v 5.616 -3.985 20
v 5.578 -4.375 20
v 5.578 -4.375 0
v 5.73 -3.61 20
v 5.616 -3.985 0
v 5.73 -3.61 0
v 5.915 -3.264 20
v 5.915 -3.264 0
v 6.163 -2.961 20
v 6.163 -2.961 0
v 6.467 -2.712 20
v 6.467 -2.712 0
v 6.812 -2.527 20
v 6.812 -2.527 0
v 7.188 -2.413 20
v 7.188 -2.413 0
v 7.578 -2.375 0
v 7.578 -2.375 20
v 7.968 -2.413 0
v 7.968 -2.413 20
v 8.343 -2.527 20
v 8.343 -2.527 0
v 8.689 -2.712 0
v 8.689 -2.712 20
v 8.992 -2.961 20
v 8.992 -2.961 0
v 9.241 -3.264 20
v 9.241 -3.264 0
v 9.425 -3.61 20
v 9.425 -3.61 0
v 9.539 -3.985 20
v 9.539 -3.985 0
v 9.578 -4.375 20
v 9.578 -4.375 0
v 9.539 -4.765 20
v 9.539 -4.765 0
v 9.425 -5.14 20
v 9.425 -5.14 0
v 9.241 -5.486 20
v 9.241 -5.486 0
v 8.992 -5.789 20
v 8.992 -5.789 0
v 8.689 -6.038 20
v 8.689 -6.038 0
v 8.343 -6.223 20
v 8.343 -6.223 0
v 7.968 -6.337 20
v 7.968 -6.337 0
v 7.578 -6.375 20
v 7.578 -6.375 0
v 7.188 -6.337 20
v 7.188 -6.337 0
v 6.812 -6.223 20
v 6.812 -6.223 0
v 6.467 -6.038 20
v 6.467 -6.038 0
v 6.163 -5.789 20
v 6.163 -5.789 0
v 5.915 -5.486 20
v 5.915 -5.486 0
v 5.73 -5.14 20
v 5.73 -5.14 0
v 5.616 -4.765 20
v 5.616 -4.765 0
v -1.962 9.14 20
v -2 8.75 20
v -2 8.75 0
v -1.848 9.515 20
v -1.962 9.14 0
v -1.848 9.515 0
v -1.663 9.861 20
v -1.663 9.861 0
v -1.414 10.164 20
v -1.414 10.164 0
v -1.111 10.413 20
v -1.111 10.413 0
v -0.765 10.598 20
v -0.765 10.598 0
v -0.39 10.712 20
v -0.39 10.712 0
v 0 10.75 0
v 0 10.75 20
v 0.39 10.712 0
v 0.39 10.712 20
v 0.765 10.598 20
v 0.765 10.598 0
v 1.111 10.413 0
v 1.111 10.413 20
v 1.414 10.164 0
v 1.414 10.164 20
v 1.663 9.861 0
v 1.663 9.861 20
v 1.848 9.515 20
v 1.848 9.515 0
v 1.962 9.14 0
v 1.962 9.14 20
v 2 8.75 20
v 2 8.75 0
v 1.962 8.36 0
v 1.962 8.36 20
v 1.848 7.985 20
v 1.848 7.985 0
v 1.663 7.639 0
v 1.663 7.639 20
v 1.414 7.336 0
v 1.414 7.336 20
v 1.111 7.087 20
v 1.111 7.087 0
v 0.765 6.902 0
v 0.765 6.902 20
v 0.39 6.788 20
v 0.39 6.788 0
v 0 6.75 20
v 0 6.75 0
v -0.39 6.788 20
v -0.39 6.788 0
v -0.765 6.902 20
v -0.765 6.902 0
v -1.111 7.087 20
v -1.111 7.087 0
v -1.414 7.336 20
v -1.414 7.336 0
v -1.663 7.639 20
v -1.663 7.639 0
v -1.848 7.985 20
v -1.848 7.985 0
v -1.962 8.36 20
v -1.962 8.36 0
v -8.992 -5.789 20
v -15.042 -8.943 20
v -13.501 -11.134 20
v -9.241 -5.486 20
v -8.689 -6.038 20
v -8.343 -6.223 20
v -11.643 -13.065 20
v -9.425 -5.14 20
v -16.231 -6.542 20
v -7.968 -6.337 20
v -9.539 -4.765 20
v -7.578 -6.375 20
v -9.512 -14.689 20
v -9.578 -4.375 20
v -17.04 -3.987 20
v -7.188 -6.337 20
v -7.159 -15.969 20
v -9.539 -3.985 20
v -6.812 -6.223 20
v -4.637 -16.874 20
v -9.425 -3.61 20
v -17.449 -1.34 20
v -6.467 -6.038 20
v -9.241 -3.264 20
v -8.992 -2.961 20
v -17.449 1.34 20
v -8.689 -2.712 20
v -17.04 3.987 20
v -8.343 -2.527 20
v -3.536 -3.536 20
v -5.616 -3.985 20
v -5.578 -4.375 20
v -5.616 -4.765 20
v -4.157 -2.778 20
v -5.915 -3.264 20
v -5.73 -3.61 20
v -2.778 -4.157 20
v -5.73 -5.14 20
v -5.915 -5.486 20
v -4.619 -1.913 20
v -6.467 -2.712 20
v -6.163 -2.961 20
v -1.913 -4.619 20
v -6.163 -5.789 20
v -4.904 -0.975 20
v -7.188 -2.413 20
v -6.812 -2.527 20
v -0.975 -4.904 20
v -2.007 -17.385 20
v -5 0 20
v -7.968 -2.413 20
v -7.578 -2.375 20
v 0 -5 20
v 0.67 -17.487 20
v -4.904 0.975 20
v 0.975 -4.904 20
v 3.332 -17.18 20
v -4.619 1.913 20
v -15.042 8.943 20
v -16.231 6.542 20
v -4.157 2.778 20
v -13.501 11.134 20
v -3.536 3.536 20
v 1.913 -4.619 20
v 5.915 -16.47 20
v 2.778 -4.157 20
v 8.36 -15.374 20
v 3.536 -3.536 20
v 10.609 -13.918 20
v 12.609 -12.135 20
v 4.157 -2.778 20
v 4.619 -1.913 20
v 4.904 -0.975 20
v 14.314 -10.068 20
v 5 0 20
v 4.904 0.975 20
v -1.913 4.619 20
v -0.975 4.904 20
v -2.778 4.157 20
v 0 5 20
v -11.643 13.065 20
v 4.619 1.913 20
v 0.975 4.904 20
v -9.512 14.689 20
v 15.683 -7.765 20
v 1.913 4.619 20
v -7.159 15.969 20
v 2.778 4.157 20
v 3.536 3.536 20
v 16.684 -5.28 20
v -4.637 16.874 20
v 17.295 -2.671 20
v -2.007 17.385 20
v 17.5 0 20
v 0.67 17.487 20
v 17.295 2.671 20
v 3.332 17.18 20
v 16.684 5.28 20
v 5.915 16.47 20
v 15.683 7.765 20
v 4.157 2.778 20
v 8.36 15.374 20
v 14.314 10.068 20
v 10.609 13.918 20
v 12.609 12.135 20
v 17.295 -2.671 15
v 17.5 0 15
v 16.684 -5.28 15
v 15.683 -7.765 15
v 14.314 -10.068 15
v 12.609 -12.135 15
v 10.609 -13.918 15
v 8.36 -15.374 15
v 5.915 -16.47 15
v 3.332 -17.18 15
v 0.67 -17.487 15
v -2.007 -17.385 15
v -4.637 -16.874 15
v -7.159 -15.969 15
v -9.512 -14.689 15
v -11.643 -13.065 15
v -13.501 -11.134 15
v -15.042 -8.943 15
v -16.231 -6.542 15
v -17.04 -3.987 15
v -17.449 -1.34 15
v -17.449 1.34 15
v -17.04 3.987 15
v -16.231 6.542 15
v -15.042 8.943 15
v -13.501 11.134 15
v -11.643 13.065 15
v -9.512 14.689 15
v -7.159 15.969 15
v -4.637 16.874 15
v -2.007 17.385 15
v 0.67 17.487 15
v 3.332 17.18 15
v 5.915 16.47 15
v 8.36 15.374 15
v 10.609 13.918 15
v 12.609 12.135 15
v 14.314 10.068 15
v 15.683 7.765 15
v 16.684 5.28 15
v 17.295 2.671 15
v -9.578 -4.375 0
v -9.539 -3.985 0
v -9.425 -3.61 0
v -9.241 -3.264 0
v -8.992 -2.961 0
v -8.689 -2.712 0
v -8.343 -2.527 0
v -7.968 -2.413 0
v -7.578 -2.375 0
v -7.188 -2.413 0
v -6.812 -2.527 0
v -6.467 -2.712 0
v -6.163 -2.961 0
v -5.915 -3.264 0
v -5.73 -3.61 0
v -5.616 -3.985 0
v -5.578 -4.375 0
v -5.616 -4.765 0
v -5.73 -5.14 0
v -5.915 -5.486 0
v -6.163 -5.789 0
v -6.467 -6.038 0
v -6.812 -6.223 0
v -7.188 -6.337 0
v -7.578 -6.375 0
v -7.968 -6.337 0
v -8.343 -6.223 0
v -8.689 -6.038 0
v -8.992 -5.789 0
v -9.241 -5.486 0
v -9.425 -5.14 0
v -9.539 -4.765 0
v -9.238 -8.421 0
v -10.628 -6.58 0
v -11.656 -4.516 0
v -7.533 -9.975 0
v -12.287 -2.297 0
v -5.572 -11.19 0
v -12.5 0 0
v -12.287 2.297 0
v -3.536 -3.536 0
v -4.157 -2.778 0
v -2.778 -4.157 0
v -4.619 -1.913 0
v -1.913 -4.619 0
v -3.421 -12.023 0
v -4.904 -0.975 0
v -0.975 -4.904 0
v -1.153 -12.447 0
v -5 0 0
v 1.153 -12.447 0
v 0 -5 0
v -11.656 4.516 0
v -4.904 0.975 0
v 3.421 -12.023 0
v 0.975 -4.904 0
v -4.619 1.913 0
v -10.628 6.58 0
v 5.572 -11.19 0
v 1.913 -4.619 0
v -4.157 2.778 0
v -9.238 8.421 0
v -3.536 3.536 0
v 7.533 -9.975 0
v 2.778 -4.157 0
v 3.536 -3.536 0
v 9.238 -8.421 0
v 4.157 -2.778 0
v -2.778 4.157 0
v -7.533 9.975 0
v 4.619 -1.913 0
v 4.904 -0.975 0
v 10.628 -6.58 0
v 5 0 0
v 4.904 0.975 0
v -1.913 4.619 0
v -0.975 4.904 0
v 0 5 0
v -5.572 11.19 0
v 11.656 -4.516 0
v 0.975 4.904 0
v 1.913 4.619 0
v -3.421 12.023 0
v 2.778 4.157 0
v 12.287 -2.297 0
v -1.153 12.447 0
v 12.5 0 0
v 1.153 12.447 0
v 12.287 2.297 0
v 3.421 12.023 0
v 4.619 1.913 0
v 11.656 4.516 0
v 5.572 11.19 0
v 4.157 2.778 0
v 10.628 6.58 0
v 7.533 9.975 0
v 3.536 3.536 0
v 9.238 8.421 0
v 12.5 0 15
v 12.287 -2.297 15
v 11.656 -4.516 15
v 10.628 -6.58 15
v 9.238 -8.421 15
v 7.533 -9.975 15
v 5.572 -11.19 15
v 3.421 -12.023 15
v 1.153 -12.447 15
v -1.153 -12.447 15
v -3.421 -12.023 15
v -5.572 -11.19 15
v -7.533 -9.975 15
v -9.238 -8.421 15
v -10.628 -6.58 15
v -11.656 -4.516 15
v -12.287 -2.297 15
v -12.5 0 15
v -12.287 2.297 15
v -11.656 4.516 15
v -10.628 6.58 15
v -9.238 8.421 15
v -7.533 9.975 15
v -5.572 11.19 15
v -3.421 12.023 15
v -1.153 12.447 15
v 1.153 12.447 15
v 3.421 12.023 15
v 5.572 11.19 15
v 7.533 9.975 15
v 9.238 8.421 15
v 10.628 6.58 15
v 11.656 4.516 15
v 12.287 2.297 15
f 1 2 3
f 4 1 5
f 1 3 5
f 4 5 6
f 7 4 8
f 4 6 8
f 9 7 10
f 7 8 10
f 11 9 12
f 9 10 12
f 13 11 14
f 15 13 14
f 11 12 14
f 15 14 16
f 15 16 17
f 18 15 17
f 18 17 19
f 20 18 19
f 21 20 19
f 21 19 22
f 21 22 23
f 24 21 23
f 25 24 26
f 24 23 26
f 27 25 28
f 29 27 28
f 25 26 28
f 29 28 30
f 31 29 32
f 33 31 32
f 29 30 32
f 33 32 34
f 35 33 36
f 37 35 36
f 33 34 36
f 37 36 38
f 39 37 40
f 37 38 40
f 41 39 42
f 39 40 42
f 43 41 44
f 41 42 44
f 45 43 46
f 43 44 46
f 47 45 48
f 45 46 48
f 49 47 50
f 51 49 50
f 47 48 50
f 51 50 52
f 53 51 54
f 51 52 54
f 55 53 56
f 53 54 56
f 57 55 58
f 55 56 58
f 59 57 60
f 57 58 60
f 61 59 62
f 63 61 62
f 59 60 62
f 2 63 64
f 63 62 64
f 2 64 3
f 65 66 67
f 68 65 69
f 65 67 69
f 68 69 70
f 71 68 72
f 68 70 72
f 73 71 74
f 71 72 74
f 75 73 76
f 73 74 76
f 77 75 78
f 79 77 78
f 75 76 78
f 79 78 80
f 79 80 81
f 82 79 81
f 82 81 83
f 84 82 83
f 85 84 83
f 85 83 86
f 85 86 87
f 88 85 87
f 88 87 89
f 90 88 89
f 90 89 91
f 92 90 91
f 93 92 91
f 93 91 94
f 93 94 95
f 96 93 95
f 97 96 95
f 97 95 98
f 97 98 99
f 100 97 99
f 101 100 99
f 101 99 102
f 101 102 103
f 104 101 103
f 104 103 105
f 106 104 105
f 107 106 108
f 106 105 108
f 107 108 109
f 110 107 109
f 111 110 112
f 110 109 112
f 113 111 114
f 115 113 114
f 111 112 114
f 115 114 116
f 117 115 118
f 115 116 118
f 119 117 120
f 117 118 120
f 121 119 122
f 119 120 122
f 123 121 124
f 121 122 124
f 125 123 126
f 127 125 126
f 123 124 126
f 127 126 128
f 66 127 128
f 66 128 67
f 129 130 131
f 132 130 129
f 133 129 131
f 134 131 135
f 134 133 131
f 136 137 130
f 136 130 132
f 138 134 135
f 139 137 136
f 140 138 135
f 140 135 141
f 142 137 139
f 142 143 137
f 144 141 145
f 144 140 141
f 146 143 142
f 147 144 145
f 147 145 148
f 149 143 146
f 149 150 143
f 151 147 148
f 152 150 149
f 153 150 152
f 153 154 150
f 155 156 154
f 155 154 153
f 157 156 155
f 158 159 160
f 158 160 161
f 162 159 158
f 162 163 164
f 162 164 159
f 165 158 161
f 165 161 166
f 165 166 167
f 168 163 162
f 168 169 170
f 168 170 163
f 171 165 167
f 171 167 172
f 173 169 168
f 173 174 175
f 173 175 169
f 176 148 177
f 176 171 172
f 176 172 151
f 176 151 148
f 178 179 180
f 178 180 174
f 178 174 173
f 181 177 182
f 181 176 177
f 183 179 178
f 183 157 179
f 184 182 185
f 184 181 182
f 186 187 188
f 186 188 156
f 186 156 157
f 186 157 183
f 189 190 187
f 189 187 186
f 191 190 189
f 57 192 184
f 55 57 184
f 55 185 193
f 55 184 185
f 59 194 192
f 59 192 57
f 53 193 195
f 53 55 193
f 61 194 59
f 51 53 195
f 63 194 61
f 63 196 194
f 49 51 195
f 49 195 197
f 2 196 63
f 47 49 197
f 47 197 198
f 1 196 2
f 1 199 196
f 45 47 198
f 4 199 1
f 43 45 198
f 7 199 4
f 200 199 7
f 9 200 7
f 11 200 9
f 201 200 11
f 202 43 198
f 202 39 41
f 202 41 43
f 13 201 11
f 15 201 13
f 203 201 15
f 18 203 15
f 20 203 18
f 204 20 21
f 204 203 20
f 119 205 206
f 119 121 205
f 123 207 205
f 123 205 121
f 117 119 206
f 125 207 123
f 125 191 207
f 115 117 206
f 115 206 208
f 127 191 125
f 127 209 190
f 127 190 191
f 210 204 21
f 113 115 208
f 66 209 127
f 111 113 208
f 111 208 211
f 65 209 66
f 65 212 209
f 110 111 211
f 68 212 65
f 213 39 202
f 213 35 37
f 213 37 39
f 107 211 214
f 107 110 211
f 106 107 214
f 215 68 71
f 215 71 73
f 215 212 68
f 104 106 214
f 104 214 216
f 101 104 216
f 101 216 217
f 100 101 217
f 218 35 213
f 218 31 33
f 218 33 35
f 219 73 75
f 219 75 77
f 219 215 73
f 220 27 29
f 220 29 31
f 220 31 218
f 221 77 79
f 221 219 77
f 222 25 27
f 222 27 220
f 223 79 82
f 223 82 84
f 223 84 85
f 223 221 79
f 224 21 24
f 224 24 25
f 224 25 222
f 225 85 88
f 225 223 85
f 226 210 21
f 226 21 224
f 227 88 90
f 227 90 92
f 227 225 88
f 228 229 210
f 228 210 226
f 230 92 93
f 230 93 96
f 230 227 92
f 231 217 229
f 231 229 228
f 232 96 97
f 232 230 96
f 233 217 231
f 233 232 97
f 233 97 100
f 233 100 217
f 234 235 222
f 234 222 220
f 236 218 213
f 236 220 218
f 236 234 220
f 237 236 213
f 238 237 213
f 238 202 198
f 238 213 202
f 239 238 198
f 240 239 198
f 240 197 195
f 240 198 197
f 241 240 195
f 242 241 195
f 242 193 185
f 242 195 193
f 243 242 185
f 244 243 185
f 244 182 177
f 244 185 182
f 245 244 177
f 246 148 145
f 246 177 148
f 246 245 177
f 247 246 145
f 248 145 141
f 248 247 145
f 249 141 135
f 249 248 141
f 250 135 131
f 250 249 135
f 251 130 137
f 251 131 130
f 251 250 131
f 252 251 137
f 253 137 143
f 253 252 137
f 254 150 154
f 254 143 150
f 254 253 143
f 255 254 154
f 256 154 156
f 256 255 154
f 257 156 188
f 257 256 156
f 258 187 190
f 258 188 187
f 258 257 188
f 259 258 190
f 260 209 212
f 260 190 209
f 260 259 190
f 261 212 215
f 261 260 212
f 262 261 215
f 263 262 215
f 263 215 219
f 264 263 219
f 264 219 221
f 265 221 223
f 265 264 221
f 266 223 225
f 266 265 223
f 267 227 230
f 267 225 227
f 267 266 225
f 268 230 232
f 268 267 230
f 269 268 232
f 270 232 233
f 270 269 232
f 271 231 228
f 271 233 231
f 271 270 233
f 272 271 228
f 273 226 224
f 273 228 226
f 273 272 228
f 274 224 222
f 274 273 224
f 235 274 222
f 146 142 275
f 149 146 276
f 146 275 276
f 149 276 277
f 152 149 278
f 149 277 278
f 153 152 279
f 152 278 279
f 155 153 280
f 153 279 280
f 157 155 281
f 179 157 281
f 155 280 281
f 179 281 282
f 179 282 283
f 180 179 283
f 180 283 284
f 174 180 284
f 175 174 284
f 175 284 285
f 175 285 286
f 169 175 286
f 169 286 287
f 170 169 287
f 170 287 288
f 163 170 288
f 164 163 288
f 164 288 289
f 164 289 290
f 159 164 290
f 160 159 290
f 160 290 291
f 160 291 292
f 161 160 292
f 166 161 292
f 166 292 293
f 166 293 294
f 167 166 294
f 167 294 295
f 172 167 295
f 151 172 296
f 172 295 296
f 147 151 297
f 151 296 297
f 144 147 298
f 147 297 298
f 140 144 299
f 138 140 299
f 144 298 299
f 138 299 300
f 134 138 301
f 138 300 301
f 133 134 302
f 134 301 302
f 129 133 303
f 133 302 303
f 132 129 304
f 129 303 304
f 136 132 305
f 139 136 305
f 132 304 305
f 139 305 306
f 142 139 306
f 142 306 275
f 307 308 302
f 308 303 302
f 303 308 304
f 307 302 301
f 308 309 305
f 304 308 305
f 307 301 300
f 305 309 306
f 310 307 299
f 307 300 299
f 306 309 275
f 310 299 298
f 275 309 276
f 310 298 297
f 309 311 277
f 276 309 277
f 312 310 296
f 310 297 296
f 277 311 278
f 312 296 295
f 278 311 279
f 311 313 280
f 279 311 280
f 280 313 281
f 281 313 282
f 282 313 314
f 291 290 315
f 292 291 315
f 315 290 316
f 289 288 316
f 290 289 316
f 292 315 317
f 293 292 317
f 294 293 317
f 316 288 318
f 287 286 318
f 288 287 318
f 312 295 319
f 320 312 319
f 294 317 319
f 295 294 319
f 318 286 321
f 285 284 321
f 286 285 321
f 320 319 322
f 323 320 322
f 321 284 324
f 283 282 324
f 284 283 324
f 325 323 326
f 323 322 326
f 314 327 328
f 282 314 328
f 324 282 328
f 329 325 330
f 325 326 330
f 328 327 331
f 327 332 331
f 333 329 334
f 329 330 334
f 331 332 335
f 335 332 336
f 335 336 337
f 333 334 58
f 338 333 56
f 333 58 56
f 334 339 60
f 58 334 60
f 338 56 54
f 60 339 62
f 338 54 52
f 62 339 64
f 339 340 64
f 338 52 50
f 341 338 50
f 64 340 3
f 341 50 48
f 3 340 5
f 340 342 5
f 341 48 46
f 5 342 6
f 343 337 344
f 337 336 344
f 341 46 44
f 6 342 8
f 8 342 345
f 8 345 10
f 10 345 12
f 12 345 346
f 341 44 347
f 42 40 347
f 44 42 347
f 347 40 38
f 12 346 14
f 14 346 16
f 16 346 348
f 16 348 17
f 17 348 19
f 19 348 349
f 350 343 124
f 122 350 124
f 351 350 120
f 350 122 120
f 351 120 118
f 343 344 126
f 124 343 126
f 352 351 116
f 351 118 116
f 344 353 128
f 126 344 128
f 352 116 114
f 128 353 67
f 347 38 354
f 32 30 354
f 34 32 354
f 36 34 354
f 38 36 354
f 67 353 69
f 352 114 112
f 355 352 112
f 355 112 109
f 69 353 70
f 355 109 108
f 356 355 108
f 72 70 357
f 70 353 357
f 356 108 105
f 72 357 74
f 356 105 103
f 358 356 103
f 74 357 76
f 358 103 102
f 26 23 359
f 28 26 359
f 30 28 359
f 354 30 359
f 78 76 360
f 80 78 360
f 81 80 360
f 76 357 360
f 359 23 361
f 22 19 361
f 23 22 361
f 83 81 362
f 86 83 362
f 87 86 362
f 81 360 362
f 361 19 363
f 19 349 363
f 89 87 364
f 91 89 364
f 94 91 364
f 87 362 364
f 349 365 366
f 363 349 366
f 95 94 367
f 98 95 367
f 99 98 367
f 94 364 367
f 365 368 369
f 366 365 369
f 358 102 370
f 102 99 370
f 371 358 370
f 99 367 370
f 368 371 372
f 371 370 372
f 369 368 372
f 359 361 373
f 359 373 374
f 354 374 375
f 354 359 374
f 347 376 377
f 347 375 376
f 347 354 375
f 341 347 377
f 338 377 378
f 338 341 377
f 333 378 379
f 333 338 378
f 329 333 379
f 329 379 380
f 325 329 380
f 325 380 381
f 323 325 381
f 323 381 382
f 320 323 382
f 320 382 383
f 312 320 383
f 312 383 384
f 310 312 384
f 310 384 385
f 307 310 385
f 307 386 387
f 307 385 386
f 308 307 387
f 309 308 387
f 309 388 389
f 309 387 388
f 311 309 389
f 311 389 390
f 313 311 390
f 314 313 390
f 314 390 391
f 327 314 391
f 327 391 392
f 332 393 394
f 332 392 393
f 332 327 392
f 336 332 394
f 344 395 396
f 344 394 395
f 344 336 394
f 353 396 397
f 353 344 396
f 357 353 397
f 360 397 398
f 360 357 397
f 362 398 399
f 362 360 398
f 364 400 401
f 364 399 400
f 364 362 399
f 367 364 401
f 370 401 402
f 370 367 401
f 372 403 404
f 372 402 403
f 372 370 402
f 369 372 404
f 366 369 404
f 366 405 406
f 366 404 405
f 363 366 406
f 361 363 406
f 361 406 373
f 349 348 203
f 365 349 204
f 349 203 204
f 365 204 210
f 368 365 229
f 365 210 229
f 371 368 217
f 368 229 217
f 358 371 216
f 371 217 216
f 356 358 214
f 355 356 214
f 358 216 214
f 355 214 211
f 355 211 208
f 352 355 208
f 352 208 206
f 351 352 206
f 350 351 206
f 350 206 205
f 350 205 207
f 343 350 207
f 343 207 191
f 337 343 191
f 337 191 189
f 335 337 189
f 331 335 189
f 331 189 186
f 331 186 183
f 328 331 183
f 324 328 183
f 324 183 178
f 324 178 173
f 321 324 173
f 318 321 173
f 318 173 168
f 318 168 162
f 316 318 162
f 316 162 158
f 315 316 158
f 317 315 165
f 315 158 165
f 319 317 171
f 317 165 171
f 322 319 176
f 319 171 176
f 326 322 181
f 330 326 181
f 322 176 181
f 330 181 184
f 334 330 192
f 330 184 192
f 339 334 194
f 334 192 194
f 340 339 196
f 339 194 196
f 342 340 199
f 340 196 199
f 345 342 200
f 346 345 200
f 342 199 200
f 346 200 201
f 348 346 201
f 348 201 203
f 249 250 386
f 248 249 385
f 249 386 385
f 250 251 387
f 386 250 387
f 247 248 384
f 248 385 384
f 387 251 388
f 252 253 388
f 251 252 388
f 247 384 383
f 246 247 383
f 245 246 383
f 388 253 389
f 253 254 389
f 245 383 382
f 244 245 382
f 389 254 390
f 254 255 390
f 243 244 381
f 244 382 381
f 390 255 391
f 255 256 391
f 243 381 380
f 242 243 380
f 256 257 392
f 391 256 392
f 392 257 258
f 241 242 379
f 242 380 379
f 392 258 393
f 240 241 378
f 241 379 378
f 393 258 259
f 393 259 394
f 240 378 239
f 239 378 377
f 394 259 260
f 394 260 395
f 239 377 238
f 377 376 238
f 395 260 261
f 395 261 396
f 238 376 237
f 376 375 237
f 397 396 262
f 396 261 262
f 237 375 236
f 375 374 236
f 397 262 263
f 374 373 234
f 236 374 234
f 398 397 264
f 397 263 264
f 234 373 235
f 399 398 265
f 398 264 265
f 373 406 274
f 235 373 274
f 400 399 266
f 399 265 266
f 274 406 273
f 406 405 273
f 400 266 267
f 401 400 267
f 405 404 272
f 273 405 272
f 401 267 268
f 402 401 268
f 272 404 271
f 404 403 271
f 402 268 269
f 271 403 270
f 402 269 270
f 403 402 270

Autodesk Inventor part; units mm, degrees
ref_plane "YZ Plane" through (0, 0, 0) normal (1, 0, 0) x (0, 1, 0)
ref_plane "XZ Plane" through (0, 0, 0) normal (0, 1, 0) x (-1, 0, 0)
ref_plane "XY Plane" through (0, 0, 0) normal (0, 0, 1) x (1, 0, 0)
sketch "Sketch1" plane through (0, 0, 0) normal (0, 0, 1) x (1, 0, 0)
  circle A0 centre (0, 0) radius 12.5
  circle A1 centre (0, 0) radius 5
  dimension "d0" = 25
  dimension "d1" = 10
extrude "Extrusion1" add sketch "Sketch1" along normal blind 15
sketch "Sketch2" plane through (0, 0, 15) normal (0, 0, 1) x (1, 0, 0)
  circle A0 centre (0, 0) radius 17.5
  dimension "d4" = 35
extrude "Extrusion2" add sketch "Sketch2" along normal blind 5
sketch "Sketch3" plane through (0, 0, 20) normal (0, 0, 1) x (1, 0, 0)
  circle A0 centre (0, 0) radius 5
  dimension "d7" = 10
extrude "Extrusion3" cut sketch "Sketch3" against normal through all
sketch "Sketch5" plane through (0, 0, 0) normal (0, 0, -1) x (-1, 0, 0)
  circle A0 centre (0, 8.75) radius 2
  circle A1 centre (-7.5777, -4.375) radius 2
  circle A2 centre (7.5777, -4.375) radius 2
  point P0 (0, 0)
  dimension "d10" = 4
  dimension "d11" = 8.75
  dimension "d14" = 360
extrude "Extrusion4" cut sketch "Sketch5" against normal through all
thread "Thread1" size "M4x0.7" class "6H" standard "ANSI Metric M Profile" full length
thread "Thread2" size "M4x0.7" class "6H" standard "ANSI Metric M Profile" full length
thread "Thread3" size "M4x0.7" class "6H" standard "ANSI Metric M Profile" full length
properties part number "CP013" material "ABS Plastic"
